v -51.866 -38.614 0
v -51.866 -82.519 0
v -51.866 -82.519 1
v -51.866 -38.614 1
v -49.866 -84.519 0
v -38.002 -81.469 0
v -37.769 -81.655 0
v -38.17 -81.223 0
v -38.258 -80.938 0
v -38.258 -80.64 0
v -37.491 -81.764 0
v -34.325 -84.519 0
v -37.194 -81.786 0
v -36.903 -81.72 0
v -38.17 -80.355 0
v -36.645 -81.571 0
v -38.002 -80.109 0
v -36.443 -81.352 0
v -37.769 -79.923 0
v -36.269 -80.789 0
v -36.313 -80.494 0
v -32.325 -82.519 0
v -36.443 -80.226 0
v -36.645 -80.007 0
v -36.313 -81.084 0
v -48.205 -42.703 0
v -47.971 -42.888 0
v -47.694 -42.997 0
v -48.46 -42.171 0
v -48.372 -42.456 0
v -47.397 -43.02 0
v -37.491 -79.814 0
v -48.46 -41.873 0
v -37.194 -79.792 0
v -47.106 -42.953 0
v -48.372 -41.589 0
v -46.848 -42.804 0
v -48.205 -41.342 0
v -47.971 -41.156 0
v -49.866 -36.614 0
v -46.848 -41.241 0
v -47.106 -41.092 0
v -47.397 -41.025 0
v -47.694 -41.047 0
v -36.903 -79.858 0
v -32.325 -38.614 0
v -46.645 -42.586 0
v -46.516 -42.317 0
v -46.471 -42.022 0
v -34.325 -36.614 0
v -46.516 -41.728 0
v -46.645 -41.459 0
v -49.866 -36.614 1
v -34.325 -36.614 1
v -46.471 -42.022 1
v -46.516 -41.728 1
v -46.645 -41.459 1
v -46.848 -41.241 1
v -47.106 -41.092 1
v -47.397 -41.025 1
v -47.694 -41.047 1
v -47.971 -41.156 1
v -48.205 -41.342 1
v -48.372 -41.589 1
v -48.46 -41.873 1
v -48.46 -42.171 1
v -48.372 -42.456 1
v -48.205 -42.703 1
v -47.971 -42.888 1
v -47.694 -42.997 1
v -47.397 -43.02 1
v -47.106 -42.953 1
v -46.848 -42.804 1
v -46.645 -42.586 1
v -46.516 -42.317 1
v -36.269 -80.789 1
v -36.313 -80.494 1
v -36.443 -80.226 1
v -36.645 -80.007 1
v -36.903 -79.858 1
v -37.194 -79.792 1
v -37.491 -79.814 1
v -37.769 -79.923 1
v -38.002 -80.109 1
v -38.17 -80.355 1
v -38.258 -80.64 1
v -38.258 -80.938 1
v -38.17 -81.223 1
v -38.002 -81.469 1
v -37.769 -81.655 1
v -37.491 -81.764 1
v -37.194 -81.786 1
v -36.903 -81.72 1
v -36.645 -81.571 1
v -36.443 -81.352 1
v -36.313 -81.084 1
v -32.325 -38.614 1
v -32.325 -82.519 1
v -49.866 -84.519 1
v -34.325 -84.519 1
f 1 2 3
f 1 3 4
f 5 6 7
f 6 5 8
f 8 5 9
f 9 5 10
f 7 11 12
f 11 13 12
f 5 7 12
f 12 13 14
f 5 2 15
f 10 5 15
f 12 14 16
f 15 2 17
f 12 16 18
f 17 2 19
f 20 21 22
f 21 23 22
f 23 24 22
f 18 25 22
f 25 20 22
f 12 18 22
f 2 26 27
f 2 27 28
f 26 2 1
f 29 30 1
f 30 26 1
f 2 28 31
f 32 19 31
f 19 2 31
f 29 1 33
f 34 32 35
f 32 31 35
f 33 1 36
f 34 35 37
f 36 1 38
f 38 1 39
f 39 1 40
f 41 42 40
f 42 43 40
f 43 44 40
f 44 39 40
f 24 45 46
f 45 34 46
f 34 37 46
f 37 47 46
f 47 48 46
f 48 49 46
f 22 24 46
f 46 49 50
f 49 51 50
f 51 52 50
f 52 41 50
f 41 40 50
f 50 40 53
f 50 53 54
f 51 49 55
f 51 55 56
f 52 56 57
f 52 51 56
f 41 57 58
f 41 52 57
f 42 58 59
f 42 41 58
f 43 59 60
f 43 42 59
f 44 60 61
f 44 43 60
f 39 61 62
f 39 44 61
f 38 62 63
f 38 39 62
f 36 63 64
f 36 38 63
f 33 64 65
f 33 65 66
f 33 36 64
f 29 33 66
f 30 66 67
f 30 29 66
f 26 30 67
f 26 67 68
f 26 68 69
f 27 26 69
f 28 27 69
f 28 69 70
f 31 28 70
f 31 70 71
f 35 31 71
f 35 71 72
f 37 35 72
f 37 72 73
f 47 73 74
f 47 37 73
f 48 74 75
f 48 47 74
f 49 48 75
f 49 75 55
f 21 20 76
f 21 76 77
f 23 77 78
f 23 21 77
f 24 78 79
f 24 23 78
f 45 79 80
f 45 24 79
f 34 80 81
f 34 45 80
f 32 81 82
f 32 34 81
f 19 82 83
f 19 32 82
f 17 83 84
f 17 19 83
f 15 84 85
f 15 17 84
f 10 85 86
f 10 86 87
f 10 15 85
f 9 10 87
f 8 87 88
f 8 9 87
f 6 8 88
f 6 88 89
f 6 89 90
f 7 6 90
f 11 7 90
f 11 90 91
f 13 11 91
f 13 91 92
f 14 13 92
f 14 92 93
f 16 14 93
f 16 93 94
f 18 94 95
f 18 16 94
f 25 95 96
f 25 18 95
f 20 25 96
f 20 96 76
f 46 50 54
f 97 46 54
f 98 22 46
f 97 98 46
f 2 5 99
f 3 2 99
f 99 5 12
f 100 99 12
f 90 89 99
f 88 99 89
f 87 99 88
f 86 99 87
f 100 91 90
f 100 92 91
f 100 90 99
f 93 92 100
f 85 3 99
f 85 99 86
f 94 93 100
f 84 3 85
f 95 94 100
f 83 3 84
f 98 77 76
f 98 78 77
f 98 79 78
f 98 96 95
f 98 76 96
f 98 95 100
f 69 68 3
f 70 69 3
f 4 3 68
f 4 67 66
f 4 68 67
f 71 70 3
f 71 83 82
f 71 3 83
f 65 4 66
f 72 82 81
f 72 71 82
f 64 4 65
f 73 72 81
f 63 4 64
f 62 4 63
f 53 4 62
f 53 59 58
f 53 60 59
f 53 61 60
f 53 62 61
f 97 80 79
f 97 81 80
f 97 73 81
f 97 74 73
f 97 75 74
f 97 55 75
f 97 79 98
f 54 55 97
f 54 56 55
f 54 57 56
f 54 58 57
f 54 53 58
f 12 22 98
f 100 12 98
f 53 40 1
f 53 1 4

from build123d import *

# Parameters (mm, degrees)
ESQUISSE1_W      = 19.540548481
ESQUISSE1_H      = 47.905200599
ESQUISSE1_R      = 1
EXTRUSION1_DEPTH = 1
CHANFREIN1_SIZE  = 2


with BuildPart() as part:
    # Esquisse1 → Extrusion1 (new body)
    with BuildSketch(Plane.XY):
        with Locations((-42.09577401, -60.566266396)):
            Rectangle(ESQUISSE1_W, ESQUISSE1_H)
        with Locations((-37.268833007, -80.789072635)):
            Circle(ESQUISSE1_R, mode=Mode.SUBTRACT)
        with Locations((-47.471458714, -42.022391679)):
            Circle(ESQUISSE1_R, mode=Mode.SUBTRACT)
    extrude(amount=EXTRUSION1_DEPTH)

    # Chanfrein1
    chanfrein1_edges = [part.edges().sort_by_distance(p)[0] for p in [
        (-51.86604825, -36.613666097, 0.5),
        (-32.325499769, -36.613666097, 0.5),
        (-32.325499769, -84.518866696, 0.5),
        (-51.86604825, -84.518866696, 0.5),
    ]]
    chamfer(chanfrein1_edges, length=CHANFREIN1_SIZE)


solid = part.part
